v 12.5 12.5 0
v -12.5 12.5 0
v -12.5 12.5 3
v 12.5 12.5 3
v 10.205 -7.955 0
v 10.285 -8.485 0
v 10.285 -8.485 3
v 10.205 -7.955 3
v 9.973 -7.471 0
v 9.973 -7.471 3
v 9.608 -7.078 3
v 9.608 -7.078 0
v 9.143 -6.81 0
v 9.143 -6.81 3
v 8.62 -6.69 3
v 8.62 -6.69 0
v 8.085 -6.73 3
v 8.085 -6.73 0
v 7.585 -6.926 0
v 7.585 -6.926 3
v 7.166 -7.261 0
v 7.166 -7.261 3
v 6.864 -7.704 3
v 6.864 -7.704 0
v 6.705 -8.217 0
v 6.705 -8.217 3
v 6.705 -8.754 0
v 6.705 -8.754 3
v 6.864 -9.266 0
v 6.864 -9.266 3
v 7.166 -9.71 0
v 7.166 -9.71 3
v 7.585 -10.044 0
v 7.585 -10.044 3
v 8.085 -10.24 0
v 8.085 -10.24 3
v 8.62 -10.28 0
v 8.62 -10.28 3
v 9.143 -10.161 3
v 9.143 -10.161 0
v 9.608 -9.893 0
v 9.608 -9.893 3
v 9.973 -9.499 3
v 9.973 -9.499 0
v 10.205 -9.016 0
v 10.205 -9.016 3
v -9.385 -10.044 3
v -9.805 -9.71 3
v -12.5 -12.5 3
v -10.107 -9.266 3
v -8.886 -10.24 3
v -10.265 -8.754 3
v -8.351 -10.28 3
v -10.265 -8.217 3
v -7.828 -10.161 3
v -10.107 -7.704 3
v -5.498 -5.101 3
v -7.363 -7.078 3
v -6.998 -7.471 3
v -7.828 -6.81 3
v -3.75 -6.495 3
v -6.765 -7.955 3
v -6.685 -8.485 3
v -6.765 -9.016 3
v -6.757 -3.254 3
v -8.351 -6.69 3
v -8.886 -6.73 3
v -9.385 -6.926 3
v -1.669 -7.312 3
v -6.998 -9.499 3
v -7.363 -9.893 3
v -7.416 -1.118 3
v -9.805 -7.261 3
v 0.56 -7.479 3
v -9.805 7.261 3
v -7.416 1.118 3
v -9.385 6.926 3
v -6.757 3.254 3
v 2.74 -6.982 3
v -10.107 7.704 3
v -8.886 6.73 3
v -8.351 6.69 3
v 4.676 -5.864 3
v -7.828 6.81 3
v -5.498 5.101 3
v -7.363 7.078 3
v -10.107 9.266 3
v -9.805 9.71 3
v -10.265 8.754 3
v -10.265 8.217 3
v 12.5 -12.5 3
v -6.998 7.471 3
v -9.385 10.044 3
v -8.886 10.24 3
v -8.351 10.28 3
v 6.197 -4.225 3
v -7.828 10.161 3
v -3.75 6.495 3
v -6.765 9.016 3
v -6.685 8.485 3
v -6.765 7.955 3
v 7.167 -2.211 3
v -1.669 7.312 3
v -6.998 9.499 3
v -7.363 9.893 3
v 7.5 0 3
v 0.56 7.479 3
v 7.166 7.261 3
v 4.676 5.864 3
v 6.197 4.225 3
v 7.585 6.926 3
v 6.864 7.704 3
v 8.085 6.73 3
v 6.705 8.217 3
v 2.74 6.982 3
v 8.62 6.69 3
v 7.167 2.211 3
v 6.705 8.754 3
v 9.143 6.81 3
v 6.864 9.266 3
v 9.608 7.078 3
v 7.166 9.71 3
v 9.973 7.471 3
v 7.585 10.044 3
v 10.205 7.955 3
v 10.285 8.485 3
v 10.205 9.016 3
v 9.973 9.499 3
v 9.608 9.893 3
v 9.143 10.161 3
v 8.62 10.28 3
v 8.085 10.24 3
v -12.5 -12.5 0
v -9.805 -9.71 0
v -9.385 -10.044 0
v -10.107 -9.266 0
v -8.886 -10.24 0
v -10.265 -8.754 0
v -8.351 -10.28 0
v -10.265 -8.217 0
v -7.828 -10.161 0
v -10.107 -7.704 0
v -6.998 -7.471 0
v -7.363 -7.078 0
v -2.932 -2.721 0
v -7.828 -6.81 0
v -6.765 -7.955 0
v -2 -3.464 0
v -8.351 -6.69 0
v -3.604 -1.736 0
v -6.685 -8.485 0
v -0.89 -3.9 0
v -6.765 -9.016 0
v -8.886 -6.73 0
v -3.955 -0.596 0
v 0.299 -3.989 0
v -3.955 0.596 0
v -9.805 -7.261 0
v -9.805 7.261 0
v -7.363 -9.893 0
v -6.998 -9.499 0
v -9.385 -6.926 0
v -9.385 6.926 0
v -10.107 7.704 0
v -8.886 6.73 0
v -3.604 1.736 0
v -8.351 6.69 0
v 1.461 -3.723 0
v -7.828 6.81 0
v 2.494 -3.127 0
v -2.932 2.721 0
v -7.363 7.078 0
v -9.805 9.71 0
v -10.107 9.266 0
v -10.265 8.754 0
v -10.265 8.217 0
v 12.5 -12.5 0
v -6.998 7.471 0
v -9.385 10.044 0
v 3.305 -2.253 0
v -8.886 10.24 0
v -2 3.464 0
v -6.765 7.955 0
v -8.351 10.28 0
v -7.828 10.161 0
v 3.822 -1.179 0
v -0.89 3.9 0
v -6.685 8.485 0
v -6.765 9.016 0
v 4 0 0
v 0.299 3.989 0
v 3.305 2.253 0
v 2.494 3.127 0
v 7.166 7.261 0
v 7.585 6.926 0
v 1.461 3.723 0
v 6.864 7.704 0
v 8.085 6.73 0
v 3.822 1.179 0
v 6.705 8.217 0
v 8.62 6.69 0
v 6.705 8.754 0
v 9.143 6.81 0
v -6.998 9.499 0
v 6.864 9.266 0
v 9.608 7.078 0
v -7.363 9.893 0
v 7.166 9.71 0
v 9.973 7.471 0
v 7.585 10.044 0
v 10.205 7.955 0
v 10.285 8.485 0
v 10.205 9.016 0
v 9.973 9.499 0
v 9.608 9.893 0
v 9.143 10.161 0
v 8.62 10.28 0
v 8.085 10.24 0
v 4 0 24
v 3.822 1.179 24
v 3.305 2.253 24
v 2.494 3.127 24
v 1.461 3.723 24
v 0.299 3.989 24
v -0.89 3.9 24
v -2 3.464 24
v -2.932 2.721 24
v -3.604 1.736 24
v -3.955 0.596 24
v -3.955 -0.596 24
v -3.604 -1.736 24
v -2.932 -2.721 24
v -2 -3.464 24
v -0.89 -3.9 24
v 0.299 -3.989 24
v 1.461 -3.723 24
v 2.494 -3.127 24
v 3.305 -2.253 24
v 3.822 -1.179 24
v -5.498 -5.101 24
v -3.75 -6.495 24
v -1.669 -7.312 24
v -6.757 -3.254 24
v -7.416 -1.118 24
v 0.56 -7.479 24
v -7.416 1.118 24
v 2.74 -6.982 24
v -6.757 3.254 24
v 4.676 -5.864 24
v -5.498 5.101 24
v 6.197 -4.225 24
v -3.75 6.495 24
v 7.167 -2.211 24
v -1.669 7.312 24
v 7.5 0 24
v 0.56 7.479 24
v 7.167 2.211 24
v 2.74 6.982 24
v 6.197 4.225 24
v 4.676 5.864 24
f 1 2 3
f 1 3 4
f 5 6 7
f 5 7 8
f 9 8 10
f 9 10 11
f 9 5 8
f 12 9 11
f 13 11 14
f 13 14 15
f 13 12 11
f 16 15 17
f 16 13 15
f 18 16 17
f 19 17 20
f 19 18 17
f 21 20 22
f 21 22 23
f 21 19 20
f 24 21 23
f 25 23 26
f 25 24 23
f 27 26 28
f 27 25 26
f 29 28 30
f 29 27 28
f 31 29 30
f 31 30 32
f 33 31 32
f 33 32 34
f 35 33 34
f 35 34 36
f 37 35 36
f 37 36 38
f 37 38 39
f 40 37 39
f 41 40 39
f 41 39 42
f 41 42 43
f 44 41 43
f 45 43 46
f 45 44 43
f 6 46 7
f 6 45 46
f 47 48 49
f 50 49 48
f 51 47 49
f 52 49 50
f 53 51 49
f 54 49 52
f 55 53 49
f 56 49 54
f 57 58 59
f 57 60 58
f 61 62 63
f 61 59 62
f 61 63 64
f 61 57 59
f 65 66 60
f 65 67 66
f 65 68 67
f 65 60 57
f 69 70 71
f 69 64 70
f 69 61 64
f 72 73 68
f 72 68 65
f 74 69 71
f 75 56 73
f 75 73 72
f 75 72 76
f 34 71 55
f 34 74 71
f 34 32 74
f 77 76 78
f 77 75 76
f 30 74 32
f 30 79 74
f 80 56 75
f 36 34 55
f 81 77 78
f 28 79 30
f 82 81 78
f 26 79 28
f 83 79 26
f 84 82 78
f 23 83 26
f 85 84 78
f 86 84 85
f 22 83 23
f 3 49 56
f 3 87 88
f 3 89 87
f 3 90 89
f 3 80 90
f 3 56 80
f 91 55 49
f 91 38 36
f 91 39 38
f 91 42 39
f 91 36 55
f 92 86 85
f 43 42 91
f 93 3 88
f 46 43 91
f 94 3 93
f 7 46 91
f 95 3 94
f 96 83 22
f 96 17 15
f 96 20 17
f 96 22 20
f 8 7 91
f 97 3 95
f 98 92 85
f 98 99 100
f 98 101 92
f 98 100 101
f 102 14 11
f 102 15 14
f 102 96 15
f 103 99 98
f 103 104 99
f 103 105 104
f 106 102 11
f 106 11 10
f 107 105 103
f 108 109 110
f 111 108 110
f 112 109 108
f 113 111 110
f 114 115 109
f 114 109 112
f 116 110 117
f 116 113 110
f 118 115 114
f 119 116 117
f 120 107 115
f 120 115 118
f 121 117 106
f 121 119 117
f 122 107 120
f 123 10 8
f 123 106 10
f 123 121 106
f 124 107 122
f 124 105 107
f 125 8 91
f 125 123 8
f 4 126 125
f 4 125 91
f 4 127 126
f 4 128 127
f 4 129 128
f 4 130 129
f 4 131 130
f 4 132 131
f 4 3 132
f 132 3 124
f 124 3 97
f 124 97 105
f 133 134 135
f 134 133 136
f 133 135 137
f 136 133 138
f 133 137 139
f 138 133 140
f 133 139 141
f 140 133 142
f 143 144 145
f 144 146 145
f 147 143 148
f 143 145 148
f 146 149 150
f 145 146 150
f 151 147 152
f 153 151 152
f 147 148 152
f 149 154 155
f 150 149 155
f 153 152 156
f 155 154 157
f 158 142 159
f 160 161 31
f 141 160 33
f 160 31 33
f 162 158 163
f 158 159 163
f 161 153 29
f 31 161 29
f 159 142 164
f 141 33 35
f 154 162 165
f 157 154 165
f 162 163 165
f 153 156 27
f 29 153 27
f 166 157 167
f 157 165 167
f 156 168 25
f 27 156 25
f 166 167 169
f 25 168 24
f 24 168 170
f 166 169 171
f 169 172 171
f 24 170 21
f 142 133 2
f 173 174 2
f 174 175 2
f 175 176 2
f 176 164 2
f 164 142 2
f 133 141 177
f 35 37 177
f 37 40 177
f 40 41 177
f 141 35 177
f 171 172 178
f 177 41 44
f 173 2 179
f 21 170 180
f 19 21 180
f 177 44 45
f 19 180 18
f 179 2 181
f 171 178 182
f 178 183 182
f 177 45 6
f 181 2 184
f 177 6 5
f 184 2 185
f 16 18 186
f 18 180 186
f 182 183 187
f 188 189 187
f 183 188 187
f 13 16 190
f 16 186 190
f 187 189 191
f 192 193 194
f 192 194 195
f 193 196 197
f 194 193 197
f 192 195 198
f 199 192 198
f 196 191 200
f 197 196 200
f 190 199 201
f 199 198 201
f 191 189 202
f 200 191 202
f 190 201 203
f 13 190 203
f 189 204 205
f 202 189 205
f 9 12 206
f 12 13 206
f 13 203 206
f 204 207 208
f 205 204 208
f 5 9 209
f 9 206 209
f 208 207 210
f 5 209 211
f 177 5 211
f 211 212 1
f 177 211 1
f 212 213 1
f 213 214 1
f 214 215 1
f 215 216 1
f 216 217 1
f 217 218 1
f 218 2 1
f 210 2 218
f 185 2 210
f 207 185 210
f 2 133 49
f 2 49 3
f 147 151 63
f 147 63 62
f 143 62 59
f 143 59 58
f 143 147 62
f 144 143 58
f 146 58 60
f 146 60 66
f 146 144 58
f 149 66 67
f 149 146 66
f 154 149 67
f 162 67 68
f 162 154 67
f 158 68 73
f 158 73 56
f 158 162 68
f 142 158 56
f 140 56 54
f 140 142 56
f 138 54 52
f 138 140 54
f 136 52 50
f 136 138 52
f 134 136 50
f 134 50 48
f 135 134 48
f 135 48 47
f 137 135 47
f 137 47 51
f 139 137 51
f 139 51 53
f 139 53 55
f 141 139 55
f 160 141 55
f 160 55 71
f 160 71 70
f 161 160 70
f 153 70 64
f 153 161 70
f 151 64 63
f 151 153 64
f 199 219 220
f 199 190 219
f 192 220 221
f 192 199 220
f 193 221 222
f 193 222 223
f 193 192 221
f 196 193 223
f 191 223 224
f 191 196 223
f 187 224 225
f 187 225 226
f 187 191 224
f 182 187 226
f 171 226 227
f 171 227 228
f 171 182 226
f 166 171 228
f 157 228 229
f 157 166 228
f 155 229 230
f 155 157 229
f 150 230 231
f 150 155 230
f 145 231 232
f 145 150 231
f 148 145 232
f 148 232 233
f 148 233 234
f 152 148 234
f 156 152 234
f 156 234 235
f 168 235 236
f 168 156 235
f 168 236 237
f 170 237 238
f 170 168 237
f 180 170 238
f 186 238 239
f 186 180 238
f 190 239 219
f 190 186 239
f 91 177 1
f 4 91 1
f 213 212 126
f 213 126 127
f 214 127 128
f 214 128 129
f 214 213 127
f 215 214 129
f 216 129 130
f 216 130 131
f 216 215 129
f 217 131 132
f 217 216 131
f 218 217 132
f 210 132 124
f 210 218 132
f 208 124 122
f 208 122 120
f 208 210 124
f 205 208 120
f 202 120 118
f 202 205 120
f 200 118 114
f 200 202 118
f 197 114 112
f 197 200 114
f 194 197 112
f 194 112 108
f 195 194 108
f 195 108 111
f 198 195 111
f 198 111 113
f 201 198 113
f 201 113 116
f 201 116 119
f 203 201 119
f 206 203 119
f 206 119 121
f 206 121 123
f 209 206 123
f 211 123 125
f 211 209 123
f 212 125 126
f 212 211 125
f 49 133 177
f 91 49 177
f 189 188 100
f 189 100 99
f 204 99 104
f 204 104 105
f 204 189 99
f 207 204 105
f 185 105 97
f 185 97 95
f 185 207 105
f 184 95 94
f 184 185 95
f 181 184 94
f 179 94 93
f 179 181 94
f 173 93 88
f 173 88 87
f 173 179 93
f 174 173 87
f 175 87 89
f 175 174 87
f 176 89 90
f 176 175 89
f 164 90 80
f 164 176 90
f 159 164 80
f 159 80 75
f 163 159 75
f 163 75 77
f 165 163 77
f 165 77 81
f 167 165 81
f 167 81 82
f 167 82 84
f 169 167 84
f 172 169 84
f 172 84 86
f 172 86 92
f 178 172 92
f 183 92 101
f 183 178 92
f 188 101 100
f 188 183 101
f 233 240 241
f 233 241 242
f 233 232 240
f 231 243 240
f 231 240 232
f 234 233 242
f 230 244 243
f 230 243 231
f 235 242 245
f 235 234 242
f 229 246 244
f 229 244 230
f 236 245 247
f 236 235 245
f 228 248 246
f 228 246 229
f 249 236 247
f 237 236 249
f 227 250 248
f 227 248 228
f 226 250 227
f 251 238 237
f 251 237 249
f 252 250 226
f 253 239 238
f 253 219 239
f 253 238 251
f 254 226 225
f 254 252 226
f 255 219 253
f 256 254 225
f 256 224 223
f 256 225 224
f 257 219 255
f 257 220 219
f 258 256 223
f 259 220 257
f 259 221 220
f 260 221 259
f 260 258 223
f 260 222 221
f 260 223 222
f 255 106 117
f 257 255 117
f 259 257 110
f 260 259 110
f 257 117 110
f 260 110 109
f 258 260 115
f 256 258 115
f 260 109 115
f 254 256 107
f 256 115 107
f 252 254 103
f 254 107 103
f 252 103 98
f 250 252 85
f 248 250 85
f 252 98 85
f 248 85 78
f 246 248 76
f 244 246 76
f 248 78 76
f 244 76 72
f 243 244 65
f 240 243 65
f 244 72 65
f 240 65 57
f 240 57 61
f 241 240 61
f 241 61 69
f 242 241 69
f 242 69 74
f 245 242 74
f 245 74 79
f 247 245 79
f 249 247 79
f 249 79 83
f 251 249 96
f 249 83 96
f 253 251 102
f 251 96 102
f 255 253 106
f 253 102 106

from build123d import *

# Parameters (mm, degrees)
SKETCH_W      = 25
SKETCH_H      = 25
SKETCH_R      = 1.8
SKETCH_R_2    = 4
PAD_DEPTH     = 3
SKETCH001_R   = 7.5
SKETCH001_R_2 = 4
PAD001_DEPTH  = 21


with BuildPart() as part:
    # Sketch → Pad (new body)
    with BuildSketch(Plane.XY):
        Rectangle(SKETCH_W, SKETCH_H)
        with Locations((-8.485281, 8.485281)):
            Circle(SKETCH_R, mode=Mode.SUBTRACT)
        with Locations((8.485281, 8.485281)):
            Circle(SKETCH_R, mode=Mode.SUBTRACT)
        with Locations((-8.485281, -8.485281)):
            Circle(SKETCH_R, mode=Mode.SUBTRACT)
        with Locations((8.485281, -8.485281)):
            Circle(SKETCH_R, mode=Mode.SUBTRACT)
        Circle(SKETCH_R_2, mode=Mode.SUBTRACT)
    extrude(amount=PAD_DEPTH)

    # Sketch001 → Pad001 (new body)
    with BuildSketch(Plane.XY.offset(3)):
        Circle(SKETCH001_R)
        Circle(SKETCH001_R_2, mode=Mode.SUBTRACT)
    extrude(amount=PAD001_DEPTH)


solid = part.part
